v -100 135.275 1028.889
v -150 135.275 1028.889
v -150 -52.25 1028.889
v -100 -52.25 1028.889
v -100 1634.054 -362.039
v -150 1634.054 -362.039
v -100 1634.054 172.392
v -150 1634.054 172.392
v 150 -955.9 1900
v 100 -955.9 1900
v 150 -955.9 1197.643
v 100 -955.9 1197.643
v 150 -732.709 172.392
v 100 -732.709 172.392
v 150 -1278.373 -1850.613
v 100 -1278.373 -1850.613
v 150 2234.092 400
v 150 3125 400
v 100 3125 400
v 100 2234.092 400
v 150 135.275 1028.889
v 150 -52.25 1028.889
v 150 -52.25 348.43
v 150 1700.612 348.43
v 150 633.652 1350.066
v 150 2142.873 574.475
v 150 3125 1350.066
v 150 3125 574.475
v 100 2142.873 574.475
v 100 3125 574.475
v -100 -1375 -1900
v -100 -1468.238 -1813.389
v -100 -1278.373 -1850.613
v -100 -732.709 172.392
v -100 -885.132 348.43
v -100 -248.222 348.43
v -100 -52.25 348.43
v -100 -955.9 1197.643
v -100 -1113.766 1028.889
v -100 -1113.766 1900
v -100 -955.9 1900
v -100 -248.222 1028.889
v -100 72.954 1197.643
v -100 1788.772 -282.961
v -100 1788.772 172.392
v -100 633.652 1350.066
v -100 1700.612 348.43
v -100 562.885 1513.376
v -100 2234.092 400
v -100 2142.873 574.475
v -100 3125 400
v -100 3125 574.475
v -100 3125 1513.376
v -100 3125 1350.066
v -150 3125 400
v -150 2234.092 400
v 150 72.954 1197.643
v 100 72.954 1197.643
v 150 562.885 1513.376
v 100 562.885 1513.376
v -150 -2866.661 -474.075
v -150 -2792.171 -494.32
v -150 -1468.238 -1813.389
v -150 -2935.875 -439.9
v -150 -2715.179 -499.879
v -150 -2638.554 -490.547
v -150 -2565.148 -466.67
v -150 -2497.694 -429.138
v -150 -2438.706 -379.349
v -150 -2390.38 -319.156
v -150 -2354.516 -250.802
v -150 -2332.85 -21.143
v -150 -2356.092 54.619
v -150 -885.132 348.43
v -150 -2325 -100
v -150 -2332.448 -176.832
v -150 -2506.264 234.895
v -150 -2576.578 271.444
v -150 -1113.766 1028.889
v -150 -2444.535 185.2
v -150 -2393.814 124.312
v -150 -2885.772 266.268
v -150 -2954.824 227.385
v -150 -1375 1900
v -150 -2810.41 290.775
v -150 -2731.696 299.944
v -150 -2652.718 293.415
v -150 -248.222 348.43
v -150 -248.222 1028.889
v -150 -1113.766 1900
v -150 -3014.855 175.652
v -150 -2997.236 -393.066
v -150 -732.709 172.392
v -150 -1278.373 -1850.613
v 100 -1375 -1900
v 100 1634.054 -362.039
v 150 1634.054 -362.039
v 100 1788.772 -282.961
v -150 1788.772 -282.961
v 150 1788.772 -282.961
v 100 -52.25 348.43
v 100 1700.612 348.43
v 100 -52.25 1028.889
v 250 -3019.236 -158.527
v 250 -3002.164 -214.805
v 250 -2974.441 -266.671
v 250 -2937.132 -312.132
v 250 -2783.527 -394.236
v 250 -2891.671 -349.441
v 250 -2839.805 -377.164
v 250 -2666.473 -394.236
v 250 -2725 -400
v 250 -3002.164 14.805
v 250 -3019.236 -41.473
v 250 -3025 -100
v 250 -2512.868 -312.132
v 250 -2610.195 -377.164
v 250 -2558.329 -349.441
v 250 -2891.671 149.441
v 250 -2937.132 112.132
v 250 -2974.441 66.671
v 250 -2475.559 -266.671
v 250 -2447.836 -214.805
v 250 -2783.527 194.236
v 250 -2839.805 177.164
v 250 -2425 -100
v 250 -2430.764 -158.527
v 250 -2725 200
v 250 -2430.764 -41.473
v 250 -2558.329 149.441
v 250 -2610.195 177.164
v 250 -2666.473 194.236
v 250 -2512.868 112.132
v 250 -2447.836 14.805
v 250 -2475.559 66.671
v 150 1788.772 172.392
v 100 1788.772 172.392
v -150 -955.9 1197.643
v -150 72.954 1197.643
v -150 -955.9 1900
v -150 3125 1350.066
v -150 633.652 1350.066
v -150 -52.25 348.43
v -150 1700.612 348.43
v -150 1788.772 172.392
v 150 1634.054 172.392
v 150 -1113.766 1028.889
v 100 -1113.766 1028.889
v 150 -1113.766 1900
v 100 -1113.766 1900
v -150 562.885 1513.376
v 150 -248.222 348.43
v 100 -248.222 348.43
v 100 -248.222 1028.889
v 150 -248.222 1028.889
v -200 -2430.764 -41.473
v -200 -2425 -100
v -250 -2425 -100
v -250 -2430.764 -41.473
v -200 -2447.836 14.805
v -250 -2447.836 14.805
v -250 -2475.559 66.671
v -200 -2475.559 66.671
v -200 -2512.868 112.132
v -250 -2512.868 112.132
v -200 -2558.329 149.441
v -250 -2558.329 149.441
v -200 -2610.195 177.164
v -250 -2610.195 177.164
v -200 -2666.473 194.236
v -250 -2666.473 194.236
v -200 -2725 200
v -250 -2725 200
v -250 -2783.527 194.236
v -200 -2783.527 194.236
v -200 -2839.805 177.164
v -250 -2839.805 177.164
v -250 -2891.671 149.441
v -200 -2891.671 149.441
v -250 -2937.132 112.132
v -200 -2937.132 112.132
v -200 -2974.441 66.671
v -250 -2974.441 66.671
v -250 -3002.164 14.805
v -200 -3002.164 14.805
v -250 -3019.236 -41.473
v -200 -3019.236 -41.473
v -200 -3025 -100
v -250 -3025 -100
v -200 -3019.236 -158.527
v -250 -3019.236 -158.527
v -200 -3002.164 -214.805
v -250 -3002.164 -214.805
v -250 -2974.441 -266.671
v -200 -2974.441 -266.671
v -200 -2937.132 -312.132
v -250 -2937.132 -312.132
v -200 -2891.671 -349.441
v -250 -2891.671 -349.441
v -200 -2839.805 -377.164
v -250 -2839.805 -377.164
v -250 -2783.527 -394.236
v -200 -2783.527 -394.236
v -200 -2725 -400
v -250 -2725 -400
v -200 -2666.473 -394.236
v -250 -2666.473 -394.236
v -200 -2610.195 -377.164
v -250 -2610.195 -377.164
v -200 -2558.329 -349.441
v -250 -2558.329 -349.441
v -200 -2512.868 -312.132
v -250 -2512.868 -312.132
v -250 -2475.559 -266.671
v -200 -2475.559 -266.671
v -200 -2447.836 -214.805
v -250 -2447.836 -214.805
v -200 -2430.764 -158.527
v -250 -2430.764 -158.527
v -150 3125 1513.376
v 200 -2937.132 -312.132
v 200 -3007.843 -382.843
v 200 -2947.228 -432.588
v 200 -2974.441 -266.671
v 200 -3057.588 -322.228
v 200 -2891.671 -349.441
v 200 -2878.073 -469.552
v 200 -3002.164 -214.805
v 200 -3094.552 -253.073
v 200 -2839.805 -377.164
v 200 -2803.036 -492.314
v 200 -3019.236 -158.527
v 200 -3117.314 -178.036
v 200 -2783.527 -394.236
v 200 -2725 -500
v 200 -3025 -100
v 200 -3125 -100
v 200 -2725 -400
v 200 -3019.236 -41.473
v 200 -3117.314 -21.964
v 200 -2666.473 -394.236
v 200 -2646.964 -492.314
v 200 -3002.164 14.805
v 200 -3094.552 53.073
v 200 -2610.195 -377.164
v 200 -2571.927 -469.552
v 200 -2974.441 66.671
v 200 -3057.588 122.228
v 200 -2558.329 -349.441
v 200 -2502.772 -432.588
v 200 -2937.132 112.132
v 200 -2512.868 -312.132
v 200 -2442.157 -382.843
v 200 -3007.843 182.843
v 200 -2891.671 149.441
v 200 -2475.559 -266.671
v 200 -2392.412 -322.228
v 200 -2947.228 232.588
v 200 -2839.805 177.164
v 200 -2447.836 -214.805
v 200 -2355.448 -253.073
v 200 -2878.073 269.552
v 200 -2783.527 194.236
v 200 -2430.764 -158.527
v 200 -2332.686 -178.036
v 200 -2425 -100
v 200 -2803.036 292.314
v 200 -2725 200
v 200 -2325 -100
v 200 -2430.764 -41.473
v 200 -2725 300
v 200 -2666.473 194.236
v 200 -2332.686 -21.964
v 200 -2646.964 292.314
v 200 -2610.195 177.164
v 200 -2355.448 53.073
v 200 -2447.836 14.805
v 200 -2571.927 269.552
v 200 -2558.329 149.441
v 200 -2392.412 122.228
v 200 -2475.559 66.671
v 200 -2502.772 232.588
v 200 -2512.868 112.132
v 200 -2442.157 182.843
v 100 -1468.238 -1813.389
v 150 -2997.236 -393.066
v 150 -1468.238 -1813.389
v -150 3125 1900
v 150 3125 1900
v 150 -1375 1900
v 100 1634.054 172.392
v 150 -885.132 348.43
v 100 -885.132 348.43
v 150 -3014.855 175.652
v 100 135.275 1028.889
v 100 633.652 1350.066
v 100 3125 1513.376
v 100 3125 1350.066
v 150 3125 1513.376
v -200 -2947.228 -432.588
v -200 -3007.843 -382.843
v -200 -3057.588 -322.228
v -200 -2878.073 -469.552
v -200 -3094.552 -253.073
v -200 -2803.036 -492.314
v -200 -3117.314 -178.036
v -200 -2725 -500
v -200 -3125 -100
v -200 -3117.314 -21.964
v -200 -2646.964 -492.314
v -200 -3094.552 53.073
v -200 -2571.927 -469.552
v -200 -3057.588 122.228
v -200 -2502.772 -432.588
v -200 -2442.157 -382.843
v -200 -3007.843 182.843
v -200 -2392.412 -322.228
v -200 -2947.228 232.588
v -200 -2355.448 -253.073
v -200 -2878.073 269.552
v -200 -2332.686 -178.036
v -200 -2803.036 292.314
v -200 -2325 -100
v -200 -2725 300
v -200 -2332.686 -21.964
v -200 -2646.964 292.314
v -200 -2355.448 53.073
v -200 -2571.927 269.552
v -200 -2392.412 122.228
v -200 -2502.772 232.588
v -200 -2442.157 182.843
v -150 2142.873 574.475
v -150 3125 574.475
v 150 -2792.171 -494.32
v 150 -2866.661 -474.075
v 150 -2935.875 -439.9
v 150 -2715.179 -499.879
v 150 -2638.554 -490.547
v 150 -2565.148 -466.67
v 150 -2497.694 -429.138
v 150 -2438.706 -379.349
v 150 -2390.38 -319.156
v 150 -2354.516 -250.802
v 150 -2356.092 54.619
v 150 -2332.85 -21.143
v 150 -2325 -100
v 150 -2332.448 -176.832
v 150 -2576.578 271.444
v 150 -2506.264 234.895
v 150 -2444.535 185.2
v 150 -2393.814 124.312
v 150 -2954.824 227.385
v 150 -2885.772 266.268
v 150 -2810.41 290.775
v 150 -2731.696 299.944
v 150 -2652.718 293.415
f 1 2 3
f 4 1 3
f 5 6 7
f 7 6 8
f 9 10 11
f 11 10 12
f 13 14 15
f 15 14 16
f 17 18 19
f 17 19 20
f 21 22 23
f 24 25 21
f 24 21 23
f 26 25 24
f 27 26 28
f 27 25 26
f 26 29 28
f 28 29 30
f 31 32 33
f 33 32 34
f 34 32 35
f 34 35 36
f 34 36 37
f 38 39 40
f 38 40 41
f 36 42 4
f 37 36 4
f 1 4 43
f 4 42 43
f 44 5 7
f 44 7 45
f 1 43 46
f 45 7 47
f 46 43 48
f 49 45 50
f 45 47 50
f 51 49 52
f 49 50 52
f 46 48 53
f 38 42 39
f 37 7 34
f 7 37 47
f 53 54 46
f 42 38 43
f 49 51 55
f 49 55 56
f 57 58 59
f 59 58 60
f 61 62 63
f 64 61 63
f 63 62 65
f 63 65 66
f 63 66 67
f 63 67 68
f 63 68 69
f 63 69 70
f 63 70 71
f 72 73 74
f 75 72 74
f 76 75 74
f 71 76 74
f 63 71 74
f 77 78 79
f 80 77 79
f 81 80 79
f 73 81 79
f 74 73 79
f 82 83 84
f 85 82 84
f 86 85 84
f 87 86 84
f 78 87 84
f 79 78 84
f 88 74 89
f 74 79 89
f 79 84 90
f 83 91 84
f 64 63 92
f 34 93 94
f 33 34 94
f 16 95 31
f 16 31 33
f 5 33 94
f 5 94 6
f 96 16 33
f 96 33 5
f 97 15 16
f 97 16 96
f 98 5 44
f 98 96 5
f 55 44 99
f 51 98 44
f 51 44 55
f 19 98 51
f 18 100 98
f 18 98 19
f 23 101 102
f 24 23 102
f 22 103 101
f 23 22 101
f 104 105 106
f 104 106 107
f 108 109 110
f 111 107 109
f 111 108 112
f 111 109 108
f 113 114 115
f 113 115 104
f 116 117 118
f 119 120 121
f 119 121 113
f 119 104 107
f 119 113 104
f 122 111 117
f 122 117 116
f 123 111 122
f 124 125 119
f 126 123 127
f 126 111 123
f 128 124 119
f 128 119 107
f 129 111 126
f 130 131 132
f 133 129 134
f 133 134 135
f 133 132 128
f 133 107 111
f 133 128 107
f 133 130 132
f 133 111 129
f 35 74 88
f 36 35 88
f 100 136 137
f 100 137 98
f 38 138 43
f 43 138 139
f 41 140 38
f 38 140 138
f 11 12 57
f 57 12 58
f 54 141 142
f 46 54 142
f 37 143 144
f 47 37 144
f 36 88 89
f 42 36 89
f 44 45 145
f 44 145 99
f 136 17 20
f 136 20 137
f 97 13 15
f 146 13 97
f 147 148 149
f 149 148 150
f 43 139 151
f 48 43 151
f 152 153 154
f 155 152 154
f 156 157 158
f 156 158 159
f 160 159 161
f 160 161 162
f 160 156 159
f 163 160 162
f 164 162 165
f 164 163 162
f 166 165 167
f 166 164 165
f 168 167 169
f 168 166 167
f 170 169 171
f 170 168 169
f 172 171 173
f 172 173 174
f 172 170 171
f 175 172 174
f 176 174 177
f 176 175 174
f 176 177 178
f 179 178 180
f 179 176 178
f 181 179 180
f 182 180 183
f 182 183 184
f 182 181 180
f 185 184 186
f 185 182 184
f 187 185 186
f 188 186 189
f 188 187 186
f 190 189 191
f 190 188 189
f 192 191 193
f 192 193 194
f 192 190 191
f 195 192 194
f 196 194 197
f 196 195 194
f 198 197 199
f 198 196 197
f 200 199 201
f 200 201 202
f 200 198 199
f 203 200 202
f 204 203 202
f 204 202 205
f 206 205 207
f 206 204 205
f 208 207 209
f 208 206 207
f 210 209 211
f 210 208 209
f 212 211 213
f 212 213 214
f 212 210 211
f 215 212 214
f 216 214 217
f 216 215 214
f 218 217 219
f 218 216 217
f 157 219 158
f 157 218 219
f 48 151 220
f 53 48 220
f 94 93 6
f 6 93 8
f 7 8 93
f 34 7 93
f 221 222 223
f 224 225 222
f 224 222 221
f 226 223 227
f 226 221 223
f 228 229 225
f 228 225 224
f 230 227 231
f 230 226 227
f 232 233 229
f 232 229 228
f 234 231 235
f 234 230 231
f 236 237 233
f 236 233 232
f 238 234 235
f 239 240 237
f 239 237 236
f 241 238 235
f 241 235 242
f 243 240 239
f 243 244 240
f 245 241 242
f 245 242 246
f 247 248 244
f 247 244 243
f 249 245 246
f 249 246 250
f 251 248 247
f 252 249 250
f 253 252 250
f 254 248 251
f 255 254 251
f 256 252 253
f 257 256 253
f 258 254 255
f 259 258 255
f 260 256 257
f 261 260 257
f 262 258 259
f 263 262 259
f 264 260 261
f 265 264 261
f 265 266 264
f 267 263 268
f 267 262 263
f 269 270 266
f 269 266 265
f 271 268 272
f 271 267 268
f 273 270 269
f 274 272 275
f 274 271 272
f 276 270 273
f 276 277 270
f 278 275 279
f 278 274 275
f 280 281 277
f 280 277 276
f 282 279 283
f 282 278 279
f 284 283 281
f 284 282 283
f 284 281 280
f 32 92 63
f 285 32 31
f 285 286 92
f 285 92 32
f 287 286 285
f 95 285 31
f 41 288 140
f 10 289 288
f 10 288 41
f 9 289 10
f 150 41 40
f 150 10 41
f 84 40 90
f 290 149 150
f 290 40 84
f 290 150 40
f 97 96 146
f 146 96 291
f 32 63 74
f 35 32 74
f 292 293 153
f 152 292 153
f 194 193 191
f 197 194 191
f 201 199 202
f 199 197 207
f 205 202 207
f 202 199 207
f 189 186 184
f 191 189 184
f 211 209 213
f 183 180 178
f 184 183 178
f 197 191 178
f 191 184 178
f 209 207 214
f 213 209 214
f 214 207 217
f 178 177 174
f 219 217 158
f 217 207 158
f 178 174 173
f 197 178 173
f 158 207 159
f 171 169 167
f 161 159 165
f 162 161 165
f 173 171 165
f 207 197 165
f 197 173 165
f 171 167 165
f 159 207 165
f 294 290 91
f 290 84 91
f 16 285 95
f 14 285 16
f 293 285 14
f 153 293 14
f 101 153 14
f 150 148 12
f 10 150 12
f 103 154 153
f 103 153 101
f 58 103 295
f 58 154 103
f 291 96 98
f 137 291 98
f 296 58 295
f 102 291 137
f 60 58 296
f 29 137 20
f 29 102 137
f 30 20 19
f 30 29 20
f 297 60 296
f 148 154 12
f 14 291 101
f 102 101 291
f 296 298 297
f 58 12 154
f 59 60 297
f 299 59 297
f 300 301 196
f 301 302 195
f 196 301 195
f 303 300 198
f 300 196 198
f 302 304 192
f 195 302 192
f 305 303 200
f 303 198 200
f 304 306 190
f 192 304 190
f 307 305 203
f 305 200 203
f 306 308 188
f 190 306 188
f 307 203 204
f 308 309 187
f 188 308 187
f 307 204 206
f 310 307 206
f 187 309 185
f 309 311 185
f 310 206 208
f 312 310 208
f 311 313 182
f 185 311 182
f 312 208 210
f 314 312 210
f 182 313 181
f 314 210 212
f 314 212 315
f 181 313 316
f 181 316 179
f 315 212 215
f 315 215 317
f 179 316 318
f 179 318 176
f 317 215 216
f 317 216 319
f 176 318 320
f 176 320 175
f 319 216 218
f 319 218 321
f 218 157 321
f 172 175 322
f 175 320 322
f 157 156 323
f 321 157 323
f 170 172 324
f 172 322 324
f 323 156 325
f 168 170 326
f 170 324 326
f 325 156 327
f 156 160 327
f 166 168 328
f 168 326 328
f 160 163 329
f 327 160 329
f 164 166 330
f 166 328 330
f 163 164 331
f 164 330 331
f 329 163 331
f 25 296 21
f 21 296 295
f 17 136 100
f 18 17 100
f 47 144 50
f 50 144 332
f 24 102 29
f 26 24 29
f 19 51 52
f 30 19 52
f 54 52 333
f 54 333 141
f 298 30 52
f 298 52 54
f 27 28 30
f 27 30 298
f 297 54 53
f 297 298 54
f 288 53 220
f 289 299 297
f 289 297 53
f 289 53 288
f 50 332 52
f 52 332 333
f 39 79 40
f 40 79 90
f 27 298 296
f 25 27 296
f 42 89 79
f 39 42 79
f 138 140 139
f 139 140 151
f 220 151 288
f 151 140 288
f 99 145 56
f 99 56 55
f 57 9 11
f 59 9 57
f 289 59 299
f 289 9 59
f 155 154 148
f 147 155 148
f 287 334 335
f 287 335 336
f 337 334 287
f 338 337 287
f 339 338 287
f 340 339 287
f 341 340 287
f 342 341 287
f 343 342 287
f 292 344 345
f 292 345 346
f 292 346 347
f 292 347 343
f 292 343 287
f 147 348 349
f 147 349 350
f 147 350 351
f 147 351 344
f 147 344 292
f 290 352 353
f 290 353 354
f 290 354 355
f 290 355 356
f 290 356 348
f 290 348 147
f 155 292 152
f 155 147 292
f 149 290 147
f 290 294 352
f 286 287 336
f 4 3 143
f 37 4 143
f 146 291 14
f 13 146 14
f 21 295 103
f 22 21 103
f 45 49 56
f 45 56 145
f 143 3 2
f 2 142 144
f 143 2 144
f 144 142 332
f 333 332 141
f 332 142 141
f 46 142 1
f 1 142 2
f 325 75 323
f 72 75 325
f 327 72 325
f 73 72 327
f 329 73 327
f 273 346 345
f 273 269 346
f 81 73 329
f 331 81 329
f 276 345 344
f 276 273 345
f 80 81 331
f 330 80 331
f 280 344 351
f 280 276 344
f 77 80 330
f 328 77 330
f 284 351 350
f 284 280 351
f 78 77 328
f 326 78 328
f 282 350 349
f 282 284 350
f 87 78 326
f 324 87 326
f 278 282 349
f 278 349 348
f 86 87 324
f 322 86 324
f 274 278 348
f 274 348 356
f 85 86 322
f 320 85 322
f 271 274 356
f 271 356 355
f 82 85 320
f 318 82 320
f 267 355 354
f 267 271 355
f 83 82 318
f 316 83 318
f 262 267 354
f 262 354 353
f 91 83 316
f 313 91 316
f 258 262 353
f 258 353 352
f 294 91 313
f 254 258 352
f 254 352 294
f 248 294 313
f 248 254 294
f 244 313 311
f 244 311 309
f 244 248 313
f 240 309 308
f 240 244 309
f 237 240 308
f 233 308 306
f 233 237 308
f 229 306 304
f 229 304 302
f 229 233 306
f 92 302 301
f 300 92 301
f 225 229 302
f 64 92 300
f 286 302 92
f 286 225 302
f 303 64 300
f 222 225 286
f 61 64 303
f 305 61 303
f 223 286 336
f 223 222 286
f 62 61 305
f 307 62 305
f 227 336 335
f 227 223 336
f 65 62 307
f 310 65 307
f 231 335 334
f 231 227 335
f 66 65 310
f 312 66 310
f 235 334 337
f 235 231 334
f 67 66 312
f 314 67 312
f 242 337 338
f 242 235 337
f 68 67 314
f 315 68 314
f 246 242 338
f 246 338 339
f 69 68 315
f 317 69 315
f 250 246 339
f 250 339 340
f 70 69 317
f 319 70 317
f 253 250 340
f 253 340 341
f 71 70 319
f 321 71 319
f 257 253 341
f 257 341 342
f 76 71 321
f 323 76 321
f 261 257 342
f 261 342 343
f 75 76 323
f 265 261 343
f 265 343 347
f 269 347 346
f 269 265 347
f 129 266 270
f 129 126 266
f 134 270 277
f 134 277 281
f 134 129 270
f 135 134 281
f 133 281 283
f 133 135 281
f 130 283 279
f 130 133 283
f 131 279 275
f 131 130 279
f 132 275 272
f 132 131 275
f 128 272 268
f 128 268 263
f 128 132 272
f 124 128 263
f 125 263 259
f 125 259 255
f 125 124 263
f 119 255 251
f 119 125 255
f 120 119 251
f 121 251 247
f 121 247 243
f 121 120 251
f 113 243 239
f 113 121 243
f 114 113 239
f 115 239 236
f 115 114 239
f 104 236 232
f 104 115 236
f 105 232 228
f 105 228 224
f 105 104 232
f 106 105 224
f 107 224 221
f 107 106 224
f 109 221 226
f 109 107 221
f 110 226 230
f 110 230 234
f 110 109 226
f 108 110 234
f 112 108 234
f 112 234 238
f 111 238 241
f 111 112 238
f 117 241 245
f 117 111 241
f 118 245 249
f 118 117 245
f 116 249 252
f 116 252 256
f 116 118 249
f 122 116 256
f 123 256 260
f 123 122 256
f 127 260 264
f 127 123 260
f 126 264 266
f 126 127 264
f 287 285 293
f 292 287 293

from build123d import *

# Parameters (mm, degrees)
F1_DEPTH = 100
F0_R     = 300
F2_DEPTH = 200
F3_DEPTH = 250
F4_DEPTH = 150


with BuildPart() as f1:
    # F0 (on Right) → F1 (new body, symmetric)
    with BuildSketch(Plane.YZ):
        Polygon((-955.8997750282, 1900), (-1113.7663125992, 1900), (-1113.7663125992, 1028.8891792297), (-248.2224702835, 1028.8891792297), (-248.2224702835, 348.4302759171), (-885.1320147514, 348.4302759171), (-1468.2381079638, -1813.3888693855), (-1375, -1900), (-1278.3731311349, -1850.6129336911), (-732.7092289925, 172.3922865995), (1634.0536525825, 172.3922865995), (1634.0536525825, -362.0392442356), (1788.7723194661, -282.9608144951), (1788.7723194661, 172.3922865995), (2234.091758728, 400), (3125, 400), (3125, 574.4746935349), (2142.8727660454, 574.4746935349), (1700.611948967, 348.4302759171), (-52.2503331304, 348.4302759171), (-52.2503331304, 1028.8891792297), (135.2747557652, 1028.8891792297), (633.6522698402, 1350.0658273697), (3125, 1350.0658273697), (3125, 1513.3759975433), (562.8845095634, 1513.3759975433), (72.9541033506, 1197.6430416107), (-955.8997750282, 1197.6430416107), align=None)
    extrude(amount=F1_DEPTH, both=True)



with BuildPart() as f2:
    # F0 (on Right) → F2 (new body, symmetric)
    with BuildSketch(Plane.YZ):
        with BuildLine():
            ThreePointArc((-3014.8549841969, 175.6521143329), (-3096.4444732112, 48.4217077144), (-3125, -99.9999988374))
            ThreePointArc((-3125, -99.9999988374), (-3091.6704092333, -259.8524663329), (-2997.2359441847, -393.0658470274))
            ThreePointArc((-2997.2359441847, -393.0658470274), (-2565.1475331342, -466.670409001), (-2325, -100))
            ThreePointArc((-2325, -100), (-2576.5782928254, 271.4444734269), (-3014.8549841969, 175.6521143329))
        make_face()
        with Locations((-2725, -100)):
            Circle(F0_R, mode=Mode.SUBTRACT)
    extrude(amount=F2_DEPTH, both=True)

    # F0 (on Right) → F3 (join, symmetric)
    with BuildSketch(Plane.YZ):
        with Locations((-2725, -100)):
            Circle(F0_R)
    extrude(amount=F3_DEPTH, both=True)


with BuildPart() as f1_1:
    add(f1.part)

    add(f2.part)  # F4 merges F2
    # F0 (on Right) → F4 (join, symmetric)
    with BuildSketch(Plane.YZ):
        with BuildLine():
            Line((-1113.7663125992, 1900), (-1375, 1900))
            Line((-1375, 1900), (-3014.8549841969, 175.6521143329))
            ThreePointArc((-3014.8549841969, 175.6521143329), (-2576.5782928254, 271.4444734269), (-2325, -100))
            ThreePointArc((-2325, -100), (-2565.1475331342, -466.670409001), (-2997.2359441847, -393.0658470274))
            Line((-2997.2359441847, -393.0658470274), (-1468.2381079638, -1813.3888693855))
            Line((-1468.2381079638, -1813.3888693855), (-885.1320147514, 348.4302759171))
            Line((-885.1320147514, 348.4302759171), (-248.2224702835, 348.4302759171))
            Line((-248.2224702835, 348.4302759171), (-248.2224702835, 1028.8891792297))
            Line((-248.2224702835, 1028.8891792297), (-1113.7663125992, 1028.8891792297))
            Line((-1113.7663125992, 1028.8891792297), (-1113.7663125992, 1900))
        make_face()
        Polygon((3125, 1900), (-955.8997750282, 1900), (-955.8997750282, 1197.6430416107), (72.9541033506, 1197.6430416107), (562.8845095634, 1513.3759975433), (3125, 1513.3759975433), align=None)
        Polygon((3125, 574.4746935349), (3125, 1350.0658273697), (633.6522698402, 1350.0658273697), (135.2747557652, 1028.8891792297), (-52.2503331304, 1028.8891792297), (-52.2503331304, 348.4302759171), (1700.611948967, 348.4302759171), (2142.8727660454, 574.4746935349), align=None)
        Polygon((-732.7092289925, 172.3922865995), (-1278.3731311349, -1850.6129336911), (1634.0536525825, -362.0392442356), (1634.0536525825, 172.3922865995), align=None)
        Polygon((1788.7723194661, -282.9608144951), (3125, 400), (2234.091758728, 400), (1788.7723194661, 172.3922865995), align=None)
    extrude(amount=F4_DEPTH, both=True)


solid = f1_1.part
